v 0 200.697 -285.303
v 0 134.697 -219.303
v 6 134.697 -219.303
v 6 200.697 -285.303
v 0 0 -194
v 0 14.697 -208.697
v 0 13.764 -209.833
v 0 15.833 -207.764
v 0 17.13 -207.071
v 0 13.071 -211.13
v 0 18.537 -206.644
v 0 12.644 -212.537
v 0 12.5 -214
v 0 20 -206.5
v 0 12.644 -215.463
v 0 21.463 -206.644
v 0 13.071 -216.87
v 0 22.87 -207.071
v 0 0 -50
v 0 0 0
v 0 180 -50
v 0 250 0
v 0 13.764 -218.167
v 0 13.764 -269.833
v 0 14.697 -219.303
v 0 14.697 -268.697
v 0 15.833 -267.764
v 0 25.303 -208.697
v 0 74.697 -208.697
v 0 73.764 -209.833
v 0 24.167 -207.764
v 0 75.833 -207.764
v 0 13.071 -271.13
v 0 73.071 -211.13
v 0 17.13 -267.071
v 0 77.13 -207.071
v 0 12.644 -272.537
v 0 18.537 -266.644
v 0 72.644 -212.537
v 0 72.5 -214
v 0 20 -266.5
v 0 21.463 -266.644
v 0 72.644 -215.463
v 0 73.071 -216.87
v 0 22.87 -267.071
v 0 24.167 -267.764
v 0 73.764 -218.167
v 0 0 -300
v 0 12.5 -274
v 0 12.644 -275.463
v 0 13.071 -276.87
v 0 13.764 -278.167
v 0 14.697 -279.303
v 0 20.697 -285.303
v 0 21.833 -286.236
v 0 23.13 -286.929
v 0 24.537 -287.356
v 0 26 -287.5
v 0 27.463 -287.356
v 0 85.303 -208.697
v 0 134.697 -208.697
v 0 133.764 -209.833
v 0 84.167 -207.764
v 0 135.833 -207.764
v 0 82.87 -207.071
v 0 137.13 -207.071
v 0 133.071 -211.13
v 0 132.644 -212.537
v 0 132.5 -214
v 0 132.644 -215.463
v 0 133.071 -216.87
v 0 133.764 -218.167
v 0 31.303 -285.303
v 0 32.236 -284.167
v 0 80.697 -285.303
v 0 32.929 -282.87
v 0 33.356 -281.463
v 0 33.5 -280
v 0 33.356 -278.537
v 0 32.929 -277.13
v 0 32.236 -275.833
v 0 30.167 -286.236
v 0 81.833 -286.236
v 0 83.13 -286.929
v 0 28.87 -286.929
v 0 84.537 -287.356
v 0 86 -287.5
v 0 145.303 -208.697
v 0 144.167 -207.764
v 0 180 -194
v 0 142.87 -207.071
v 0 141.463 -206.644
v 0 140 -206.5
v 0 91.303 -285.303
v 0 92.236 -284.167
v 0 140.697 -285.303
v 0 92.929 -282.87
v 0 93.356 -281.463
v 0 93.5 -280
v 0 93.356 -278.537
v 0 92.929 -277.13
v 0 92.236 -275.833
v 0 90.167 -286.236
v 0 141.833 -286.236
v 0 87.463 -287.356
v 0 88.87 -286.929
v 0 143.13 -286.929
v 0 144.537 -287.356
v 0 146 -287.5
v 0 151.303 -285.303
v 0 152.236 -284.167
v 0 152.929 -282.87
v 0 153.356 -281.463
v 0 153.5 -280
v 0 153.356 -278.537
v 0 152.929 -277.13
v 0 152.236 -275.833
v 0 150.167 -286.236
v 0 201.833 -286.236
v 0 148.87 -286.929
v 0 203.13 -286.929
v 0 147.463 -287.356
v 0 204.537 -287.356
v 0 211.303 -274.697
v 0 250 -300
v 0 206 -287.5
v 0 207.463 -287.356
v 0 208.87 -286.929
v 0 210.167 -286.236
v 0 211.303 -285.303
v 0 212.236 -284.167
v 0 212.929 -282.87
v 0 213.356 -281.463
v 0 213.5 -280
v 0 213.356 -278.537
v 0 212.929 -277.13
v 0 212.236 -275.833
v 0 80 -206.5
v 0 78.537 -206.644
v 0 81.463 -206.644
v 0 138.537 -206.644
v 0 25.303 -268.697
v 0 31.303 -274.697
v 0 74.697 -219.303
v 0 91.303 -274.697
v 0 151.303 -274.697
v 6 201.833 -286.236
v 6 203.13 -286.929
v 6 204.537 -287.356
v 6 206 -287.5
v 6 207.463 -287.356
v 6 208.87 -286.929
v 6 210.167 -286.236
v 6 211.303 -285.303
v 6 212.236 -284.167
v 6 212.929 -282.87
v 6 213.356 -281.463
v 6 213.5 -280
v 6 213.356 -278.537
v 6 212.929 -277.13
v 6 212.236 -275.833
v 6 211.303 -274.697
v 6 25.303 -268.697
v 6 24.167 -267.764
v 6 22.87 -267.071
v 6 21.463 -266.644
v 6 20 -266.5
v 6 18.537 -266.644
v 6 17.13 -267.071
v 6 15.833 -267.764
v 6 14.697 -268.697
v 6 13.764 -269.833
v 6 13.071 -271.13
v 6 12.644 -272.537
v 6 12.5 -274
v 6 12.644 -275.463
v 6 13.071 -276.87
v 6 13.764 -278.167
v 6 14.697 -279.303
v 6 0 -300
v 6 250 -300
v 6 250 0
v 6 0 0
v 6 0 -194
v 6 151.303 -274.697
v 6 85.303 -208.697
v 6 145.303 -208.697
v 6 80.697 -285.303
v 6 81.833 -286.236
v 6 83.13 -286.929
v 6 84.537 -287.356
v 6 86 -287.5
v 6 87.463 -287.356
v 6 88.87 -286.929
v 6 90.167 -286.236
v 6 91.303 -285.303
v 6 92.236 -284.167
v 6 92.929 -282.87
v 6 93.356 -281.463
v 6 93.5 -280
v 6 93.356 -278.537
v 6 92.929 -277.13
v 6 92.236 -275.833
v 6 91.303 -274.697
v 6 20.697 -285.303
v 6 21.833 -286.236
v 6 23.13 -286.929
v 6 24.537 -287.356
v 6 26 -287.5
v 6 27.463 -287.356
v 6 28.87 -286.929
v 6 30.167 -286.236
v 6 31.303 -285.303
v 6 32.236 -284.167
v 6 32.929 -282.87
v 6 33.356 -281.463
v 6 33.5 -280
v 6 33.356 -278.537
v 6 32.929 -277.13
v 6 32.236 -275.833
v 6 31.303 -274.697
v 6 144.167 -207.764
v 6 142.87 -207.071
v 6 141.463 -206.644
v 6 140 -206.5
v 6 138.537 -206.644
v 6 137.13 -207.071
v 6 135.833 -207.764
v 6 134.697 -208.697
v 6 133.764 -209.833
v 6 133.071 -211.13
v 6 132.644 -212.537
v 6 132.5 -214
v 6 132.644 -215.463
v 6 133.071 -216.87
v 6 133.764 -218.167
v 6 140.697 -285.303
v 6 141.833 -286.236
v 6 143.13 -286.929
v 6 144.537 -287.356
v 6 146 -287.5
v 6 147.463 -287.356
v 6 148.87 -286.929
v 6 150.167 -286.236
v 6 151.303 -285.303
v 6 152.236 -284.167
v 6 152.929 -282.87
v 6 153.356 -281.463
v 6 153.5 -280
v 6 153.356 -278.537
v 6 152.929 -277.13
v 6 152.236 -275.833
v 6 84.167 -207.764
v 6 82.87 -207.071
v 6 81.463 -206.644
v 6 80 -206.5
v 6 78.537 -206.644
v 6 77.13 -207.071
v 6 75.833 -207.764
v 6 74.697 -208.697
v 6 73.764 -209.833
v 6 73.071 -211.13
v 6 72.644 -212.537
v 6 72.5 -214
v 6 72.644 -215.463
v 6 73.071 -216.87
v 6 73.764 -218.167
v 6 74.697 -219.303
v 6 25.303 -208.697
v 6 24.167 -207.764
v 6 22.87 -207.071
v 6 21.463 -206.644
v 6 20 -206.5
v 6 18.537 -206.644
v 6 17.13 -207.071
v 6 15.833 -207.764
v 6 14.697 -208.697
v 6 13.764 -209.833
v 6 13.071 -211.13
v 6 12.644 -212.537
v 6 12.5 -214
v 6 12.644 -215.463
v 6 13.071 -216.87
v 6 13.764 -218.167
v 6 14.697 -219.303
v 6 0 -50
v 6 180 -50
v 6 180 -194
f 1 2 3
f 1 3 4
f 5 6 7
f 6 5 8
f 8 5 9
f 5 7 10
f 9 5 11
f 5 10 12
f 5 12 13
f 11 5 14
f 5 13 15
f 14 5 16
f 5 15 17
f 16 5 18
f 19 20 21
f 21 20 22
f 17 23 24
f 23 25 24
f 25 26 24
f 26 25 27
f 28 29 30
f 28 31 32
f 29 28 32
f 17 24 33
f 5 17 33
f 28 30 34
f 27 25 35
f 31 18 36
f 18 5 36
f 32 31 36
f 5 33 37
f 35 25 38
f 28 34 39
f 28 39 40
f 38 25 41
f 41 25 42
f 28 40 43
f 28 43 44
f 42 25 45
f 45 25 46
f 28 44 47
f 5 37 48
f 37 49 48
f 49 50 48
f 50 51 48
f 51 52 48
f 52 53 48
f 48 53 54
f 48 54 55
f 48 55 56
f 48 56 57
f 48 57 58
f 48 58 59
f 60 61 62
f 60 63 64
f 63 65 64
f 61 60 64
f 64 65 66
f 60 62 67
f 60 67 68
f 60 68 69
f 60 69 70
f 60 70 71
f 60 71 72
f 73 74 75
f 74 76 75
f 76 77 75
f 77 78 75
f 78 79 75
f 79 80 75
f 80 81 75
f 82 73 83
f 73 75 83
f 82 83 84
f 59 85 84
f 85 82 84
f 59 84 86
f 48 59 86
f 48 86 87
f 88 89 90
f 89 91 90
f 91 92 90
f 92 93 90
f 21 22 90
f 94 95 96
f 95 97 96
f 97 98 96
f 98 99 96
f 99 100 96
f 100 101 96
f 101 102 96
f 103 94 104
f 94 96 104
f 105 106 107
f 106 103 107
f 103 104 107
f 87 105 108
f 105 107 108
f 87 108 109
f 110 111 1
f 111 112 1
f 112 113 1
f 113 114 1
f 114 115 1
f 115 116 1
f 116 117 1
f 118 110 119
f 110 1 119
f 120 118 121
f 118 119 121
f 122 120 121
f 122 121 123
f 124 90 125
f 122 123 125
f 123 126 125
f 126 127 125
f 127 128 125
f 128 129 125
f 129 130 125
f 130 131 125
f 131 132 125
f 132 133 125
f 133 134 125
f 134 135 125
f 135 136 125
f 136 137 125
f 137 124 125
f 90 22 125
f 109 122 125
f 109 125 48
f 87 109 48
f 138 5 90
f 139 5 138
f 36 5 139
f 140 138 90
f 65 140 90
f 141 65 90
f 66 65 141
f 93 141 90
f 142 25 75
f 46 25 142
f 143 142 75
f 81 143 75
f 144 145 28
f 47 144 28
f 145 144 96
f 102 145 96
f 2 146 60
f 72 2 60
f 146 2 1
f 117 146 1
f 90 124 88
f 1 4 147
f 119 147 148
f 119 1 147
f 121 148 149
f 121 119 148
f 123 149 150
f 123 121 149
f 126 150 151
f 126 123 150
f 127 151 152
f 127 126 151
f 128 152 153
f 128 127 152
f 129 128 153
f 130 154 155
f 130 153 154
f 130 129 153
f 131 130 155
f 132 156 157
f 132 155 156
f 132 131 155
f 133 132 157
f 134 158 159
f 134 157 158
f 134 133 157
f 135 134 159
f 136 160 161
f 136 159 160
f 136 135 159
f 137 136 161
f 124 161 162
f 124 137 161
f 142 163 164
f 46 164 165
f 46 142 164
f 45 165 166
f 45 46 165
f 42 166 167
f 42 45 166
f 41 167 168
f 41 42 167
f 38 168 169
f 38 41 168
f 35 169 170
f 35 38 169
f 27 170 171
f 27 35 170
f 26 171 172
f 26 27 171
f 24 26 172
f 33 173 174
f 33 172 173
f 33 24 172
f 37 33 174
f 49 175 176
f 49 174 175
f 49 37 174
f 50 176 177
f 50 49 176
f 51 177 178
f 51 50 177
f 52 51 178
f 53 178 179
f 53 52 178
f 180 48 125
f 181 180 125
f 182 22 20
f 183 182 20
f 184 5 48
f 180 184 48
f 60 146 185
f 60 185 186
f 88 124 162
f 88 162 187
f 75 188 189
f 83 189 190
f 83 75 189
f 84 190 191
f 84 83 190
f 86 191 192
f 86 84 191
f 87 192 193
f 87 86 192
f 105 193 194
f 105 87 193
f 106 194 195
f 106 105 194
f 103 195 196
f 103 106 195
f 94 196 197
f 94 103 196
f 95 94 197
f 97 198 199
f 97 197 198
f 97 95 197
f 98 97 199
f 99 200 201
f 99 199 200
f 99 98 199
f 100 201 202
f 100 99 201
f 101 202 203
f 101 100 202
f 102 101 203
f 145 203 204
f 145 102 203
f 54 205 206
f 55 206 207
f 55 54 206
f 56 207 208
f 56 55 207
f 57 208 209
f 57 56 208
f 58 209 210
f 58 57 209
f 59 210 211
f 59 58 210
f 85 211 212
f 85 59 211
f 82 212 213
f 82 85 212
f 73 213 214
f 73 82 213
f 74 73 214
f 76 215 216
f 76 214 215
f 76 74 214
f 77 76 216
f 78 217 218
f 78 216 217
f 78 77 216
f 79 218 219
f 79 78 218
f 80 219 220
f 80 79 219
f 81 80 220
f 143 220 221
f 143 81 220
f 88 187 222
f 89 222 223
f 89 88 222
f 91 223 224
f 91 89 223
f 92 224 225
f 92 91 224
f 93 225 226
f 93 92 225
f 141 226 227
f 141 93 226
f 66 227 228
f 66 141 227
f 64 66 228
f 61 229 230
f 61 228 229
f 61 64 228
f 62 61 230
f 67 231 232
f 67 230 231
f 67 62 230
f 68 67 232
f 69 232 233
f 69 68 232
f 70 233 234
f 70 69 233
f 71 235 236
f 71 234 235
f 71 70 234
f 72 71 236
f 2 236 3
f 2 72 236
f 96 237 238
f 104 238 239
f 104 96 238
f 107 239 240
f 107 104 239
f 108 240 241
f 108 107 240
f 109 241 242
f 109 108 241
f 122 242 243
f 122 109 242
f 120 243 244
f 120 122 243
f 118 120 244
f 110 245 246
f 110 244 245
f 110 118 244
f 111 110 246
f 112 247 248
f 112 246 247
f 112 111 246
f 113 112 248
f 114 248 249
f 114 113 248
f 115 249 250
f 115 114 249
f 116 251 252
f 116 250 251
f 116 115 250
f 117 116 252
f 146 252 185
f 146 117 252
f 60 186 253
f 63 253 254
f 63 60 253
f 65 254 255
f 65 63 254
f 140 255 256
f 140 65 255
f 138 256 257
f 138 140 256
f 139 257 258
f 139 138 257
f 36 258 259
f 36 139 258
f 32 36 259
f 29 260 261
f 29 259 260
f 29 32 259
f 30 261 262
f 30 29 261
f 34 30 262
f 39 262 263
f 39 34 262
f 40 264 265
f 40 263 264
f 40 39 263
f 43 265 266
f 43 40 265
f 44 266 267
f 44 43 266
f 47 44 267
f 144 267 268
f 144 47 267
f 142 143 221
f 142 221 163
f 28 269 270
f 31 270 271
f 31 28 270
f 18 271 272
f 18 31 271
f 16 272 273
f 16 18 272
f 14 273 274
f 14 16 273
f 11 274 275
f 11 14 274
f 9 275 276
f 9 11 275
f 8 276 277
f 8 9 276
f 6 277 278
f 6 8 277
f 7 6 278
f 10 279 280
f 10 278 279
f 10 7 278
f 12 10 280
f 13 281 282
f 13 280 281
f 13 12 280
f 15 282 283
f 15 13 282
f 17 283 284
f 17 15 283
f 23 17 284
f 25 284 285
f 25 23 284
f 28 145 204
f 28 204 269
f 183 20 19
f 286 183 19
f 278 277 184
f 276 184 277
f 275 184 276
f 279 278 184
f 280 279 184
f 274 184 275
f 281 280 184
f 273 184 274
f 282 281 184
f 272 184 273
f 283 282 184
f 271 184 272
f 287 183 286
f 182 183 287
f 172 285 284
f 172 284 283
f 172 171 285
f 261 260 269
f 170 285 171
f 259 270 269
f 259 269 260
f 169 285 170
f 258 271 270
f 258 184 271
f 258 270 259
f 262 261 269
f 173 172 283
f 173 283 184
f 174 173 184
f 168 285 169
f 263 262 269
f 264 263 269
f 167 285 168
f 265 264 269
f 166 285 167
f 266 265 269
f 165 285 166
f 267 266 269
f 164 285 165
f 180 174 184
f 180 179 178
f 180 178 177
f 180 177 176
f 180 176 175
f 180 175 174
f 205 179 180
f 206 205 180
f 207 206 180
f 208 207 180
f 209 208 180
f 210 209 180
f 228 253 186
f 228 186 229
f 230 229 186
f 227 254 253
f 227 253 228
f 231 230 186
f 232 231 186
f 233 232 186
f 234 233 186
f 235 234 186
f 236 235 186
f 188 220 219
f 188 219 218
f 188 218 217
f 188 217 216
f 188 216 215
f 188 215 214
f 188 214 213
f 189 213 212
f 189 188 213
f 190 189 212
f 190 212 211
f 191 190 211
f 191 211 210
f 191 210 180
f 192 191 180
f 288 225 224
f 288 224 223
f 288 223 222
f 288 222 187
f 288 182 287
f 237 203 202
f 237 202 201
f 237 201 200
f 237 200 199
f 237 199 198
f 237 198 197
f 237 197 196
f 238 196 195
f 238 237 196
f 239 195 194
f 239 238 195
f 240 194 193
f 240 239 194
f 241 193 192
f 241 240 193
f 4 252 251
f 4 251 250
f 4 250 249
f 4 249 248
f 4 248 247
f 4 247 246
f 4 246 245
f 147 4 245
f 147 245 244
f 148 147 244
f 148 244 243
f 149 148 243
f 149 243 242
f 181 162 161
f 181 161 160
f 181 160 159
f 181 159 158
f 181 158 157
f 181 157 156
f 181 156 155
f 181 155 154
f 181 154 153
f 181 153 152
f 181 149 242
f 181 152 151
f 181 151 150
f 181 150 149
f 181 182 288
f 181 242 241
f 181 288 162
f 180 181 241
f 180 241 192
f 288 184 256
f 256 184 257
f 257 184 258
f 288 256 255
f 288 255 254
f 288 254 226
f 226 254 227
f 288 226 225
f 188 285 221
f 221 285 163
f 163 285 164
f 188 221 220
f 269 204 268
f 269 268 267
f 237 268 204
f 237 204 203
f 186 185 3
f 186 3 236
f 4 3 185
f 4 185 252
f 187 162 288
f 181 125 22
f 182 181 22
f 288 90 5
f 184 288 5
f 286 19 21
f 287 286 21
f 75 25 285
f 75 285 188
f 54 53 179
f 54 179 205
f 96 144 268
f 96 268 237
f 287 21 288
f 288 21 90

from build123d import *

# Parameters (mm, degrees)
BOSS_EXTRUDE1_DEPTH = 6
SKETCH2_W           = 106
SKETCH2_H           = 107.951063415
BOSS_EXTRUDE3_DEPTH = 6
CUT_EXTRUDE1_DEPTH  = 10
LPATTERN1_COUNT     = 3
LPATTERN1_PITCH     = 60


with BuildPart() as part:
    # Sketch1 → Boss-Extrude1 (new body)
    with BuildSketch(Plane(origin=(0, 0, 0), x_dir=(0, 0, -1), z_dir=(1, 0, 0))):
        Polygon((0, 0), (50, 0), (50, 180), (194, 180), (194, 0), (300, 0), (300, 250), (0, 250), align=None)
        with BuildLine():
            Line((274.696699141, 14.696699141), (208.696699141, 80.696699141))
            ThreePointArc((208.696699141, 80.696699141), (208.696699141, 91.303300859), (219.303300859, 91.303300859))
            Line((219.303300859, 91.303300859), (285.303300859, 25.303300859))
            ThreePointArc((285.303300859, 25.303300859), (285.303300859, 14.696699141), (274.696699141, 14.696699141))
        make_face(mode=Mode.SUBTRACT)
    extrude(amount=BOSS_EXTRUDE1_DEPTH)

    # Sketch2 → Boss-Extrude3 (add)
    with BuildSketch(Plane.ZY):
        with Locations((-247, 53.975531708)):
            Rectangle(SKETCH2_W, SKETCH2_H)
    extrude(amount=-BOSS_EXTRUDE3_DEPTH)

    # Sketch3 → Cut-Extrude1 (cut)
    with BuildSketch(Plane.ZY):
        with BuildLine():
            Line((-219.303300859, 14.696699141), (-285.303300859, 80.696699141))
            ThreePointArc((-285.303300859, 80.696699141), (-285.303300859, 91.303300859), (-274.696699141, 91.303300859))
            Line((-274.696699141, 91.303300859), (-208.696699141, 25.303300859))
            ThreePointArc((-208.696699141, 25.303300859), (-208.696699141, 14.696699141), (-219.303300859, 14.696699141))
        make_face()
        with BuildLine():
            Line((-279.303300859, 14.696699141), (-285.303300859, 20.696699141))
            ThreePointArc((-285.303300859, 20.696699141), (-285.303300859, 31.303300859), (-274.696699141, 31.303300859))
            Line((-274.696699141, 31.303300859), (-268.696699141, 25.303300859))
            ThreePointArc((-268.696699141, 25.303300859), (-268.696699141, 14.696699141), (-279.303300859, 14.696699141))
        make_face()
        with BuildLine():
            Line((-214.696699141, 273.303300859), (-208.696699141, 267.303300859))
            ThreePointArc((-208.696699141, 267.303300859), (-208.696699141, 256.696699141), (-219.303300859, 256.696699141))
            Line((-219.303300859, 256.696699141), (-225.303300859, 262.696699141))
            ThreePointArc((-225.303300859, 262.696699141), (-225.303300859, 273.303300859), (-214.696699141, 273.303300859))
        make_face()
    cut_extrude1 = extrude(amount=-CUT_EXTRUDE1_DEPTH, mode=Mode.SUBTRACT)

    # LPattern1: Cut-Extrude1 ×3
    with Locations(*[(0, i * LPATTERN1_PITCH, 0) for i in range(1, LPATTERN1_COUNT)]):
        add(cut_extrude1, mode=Mode.SUBTRACT)


solid = part.part
